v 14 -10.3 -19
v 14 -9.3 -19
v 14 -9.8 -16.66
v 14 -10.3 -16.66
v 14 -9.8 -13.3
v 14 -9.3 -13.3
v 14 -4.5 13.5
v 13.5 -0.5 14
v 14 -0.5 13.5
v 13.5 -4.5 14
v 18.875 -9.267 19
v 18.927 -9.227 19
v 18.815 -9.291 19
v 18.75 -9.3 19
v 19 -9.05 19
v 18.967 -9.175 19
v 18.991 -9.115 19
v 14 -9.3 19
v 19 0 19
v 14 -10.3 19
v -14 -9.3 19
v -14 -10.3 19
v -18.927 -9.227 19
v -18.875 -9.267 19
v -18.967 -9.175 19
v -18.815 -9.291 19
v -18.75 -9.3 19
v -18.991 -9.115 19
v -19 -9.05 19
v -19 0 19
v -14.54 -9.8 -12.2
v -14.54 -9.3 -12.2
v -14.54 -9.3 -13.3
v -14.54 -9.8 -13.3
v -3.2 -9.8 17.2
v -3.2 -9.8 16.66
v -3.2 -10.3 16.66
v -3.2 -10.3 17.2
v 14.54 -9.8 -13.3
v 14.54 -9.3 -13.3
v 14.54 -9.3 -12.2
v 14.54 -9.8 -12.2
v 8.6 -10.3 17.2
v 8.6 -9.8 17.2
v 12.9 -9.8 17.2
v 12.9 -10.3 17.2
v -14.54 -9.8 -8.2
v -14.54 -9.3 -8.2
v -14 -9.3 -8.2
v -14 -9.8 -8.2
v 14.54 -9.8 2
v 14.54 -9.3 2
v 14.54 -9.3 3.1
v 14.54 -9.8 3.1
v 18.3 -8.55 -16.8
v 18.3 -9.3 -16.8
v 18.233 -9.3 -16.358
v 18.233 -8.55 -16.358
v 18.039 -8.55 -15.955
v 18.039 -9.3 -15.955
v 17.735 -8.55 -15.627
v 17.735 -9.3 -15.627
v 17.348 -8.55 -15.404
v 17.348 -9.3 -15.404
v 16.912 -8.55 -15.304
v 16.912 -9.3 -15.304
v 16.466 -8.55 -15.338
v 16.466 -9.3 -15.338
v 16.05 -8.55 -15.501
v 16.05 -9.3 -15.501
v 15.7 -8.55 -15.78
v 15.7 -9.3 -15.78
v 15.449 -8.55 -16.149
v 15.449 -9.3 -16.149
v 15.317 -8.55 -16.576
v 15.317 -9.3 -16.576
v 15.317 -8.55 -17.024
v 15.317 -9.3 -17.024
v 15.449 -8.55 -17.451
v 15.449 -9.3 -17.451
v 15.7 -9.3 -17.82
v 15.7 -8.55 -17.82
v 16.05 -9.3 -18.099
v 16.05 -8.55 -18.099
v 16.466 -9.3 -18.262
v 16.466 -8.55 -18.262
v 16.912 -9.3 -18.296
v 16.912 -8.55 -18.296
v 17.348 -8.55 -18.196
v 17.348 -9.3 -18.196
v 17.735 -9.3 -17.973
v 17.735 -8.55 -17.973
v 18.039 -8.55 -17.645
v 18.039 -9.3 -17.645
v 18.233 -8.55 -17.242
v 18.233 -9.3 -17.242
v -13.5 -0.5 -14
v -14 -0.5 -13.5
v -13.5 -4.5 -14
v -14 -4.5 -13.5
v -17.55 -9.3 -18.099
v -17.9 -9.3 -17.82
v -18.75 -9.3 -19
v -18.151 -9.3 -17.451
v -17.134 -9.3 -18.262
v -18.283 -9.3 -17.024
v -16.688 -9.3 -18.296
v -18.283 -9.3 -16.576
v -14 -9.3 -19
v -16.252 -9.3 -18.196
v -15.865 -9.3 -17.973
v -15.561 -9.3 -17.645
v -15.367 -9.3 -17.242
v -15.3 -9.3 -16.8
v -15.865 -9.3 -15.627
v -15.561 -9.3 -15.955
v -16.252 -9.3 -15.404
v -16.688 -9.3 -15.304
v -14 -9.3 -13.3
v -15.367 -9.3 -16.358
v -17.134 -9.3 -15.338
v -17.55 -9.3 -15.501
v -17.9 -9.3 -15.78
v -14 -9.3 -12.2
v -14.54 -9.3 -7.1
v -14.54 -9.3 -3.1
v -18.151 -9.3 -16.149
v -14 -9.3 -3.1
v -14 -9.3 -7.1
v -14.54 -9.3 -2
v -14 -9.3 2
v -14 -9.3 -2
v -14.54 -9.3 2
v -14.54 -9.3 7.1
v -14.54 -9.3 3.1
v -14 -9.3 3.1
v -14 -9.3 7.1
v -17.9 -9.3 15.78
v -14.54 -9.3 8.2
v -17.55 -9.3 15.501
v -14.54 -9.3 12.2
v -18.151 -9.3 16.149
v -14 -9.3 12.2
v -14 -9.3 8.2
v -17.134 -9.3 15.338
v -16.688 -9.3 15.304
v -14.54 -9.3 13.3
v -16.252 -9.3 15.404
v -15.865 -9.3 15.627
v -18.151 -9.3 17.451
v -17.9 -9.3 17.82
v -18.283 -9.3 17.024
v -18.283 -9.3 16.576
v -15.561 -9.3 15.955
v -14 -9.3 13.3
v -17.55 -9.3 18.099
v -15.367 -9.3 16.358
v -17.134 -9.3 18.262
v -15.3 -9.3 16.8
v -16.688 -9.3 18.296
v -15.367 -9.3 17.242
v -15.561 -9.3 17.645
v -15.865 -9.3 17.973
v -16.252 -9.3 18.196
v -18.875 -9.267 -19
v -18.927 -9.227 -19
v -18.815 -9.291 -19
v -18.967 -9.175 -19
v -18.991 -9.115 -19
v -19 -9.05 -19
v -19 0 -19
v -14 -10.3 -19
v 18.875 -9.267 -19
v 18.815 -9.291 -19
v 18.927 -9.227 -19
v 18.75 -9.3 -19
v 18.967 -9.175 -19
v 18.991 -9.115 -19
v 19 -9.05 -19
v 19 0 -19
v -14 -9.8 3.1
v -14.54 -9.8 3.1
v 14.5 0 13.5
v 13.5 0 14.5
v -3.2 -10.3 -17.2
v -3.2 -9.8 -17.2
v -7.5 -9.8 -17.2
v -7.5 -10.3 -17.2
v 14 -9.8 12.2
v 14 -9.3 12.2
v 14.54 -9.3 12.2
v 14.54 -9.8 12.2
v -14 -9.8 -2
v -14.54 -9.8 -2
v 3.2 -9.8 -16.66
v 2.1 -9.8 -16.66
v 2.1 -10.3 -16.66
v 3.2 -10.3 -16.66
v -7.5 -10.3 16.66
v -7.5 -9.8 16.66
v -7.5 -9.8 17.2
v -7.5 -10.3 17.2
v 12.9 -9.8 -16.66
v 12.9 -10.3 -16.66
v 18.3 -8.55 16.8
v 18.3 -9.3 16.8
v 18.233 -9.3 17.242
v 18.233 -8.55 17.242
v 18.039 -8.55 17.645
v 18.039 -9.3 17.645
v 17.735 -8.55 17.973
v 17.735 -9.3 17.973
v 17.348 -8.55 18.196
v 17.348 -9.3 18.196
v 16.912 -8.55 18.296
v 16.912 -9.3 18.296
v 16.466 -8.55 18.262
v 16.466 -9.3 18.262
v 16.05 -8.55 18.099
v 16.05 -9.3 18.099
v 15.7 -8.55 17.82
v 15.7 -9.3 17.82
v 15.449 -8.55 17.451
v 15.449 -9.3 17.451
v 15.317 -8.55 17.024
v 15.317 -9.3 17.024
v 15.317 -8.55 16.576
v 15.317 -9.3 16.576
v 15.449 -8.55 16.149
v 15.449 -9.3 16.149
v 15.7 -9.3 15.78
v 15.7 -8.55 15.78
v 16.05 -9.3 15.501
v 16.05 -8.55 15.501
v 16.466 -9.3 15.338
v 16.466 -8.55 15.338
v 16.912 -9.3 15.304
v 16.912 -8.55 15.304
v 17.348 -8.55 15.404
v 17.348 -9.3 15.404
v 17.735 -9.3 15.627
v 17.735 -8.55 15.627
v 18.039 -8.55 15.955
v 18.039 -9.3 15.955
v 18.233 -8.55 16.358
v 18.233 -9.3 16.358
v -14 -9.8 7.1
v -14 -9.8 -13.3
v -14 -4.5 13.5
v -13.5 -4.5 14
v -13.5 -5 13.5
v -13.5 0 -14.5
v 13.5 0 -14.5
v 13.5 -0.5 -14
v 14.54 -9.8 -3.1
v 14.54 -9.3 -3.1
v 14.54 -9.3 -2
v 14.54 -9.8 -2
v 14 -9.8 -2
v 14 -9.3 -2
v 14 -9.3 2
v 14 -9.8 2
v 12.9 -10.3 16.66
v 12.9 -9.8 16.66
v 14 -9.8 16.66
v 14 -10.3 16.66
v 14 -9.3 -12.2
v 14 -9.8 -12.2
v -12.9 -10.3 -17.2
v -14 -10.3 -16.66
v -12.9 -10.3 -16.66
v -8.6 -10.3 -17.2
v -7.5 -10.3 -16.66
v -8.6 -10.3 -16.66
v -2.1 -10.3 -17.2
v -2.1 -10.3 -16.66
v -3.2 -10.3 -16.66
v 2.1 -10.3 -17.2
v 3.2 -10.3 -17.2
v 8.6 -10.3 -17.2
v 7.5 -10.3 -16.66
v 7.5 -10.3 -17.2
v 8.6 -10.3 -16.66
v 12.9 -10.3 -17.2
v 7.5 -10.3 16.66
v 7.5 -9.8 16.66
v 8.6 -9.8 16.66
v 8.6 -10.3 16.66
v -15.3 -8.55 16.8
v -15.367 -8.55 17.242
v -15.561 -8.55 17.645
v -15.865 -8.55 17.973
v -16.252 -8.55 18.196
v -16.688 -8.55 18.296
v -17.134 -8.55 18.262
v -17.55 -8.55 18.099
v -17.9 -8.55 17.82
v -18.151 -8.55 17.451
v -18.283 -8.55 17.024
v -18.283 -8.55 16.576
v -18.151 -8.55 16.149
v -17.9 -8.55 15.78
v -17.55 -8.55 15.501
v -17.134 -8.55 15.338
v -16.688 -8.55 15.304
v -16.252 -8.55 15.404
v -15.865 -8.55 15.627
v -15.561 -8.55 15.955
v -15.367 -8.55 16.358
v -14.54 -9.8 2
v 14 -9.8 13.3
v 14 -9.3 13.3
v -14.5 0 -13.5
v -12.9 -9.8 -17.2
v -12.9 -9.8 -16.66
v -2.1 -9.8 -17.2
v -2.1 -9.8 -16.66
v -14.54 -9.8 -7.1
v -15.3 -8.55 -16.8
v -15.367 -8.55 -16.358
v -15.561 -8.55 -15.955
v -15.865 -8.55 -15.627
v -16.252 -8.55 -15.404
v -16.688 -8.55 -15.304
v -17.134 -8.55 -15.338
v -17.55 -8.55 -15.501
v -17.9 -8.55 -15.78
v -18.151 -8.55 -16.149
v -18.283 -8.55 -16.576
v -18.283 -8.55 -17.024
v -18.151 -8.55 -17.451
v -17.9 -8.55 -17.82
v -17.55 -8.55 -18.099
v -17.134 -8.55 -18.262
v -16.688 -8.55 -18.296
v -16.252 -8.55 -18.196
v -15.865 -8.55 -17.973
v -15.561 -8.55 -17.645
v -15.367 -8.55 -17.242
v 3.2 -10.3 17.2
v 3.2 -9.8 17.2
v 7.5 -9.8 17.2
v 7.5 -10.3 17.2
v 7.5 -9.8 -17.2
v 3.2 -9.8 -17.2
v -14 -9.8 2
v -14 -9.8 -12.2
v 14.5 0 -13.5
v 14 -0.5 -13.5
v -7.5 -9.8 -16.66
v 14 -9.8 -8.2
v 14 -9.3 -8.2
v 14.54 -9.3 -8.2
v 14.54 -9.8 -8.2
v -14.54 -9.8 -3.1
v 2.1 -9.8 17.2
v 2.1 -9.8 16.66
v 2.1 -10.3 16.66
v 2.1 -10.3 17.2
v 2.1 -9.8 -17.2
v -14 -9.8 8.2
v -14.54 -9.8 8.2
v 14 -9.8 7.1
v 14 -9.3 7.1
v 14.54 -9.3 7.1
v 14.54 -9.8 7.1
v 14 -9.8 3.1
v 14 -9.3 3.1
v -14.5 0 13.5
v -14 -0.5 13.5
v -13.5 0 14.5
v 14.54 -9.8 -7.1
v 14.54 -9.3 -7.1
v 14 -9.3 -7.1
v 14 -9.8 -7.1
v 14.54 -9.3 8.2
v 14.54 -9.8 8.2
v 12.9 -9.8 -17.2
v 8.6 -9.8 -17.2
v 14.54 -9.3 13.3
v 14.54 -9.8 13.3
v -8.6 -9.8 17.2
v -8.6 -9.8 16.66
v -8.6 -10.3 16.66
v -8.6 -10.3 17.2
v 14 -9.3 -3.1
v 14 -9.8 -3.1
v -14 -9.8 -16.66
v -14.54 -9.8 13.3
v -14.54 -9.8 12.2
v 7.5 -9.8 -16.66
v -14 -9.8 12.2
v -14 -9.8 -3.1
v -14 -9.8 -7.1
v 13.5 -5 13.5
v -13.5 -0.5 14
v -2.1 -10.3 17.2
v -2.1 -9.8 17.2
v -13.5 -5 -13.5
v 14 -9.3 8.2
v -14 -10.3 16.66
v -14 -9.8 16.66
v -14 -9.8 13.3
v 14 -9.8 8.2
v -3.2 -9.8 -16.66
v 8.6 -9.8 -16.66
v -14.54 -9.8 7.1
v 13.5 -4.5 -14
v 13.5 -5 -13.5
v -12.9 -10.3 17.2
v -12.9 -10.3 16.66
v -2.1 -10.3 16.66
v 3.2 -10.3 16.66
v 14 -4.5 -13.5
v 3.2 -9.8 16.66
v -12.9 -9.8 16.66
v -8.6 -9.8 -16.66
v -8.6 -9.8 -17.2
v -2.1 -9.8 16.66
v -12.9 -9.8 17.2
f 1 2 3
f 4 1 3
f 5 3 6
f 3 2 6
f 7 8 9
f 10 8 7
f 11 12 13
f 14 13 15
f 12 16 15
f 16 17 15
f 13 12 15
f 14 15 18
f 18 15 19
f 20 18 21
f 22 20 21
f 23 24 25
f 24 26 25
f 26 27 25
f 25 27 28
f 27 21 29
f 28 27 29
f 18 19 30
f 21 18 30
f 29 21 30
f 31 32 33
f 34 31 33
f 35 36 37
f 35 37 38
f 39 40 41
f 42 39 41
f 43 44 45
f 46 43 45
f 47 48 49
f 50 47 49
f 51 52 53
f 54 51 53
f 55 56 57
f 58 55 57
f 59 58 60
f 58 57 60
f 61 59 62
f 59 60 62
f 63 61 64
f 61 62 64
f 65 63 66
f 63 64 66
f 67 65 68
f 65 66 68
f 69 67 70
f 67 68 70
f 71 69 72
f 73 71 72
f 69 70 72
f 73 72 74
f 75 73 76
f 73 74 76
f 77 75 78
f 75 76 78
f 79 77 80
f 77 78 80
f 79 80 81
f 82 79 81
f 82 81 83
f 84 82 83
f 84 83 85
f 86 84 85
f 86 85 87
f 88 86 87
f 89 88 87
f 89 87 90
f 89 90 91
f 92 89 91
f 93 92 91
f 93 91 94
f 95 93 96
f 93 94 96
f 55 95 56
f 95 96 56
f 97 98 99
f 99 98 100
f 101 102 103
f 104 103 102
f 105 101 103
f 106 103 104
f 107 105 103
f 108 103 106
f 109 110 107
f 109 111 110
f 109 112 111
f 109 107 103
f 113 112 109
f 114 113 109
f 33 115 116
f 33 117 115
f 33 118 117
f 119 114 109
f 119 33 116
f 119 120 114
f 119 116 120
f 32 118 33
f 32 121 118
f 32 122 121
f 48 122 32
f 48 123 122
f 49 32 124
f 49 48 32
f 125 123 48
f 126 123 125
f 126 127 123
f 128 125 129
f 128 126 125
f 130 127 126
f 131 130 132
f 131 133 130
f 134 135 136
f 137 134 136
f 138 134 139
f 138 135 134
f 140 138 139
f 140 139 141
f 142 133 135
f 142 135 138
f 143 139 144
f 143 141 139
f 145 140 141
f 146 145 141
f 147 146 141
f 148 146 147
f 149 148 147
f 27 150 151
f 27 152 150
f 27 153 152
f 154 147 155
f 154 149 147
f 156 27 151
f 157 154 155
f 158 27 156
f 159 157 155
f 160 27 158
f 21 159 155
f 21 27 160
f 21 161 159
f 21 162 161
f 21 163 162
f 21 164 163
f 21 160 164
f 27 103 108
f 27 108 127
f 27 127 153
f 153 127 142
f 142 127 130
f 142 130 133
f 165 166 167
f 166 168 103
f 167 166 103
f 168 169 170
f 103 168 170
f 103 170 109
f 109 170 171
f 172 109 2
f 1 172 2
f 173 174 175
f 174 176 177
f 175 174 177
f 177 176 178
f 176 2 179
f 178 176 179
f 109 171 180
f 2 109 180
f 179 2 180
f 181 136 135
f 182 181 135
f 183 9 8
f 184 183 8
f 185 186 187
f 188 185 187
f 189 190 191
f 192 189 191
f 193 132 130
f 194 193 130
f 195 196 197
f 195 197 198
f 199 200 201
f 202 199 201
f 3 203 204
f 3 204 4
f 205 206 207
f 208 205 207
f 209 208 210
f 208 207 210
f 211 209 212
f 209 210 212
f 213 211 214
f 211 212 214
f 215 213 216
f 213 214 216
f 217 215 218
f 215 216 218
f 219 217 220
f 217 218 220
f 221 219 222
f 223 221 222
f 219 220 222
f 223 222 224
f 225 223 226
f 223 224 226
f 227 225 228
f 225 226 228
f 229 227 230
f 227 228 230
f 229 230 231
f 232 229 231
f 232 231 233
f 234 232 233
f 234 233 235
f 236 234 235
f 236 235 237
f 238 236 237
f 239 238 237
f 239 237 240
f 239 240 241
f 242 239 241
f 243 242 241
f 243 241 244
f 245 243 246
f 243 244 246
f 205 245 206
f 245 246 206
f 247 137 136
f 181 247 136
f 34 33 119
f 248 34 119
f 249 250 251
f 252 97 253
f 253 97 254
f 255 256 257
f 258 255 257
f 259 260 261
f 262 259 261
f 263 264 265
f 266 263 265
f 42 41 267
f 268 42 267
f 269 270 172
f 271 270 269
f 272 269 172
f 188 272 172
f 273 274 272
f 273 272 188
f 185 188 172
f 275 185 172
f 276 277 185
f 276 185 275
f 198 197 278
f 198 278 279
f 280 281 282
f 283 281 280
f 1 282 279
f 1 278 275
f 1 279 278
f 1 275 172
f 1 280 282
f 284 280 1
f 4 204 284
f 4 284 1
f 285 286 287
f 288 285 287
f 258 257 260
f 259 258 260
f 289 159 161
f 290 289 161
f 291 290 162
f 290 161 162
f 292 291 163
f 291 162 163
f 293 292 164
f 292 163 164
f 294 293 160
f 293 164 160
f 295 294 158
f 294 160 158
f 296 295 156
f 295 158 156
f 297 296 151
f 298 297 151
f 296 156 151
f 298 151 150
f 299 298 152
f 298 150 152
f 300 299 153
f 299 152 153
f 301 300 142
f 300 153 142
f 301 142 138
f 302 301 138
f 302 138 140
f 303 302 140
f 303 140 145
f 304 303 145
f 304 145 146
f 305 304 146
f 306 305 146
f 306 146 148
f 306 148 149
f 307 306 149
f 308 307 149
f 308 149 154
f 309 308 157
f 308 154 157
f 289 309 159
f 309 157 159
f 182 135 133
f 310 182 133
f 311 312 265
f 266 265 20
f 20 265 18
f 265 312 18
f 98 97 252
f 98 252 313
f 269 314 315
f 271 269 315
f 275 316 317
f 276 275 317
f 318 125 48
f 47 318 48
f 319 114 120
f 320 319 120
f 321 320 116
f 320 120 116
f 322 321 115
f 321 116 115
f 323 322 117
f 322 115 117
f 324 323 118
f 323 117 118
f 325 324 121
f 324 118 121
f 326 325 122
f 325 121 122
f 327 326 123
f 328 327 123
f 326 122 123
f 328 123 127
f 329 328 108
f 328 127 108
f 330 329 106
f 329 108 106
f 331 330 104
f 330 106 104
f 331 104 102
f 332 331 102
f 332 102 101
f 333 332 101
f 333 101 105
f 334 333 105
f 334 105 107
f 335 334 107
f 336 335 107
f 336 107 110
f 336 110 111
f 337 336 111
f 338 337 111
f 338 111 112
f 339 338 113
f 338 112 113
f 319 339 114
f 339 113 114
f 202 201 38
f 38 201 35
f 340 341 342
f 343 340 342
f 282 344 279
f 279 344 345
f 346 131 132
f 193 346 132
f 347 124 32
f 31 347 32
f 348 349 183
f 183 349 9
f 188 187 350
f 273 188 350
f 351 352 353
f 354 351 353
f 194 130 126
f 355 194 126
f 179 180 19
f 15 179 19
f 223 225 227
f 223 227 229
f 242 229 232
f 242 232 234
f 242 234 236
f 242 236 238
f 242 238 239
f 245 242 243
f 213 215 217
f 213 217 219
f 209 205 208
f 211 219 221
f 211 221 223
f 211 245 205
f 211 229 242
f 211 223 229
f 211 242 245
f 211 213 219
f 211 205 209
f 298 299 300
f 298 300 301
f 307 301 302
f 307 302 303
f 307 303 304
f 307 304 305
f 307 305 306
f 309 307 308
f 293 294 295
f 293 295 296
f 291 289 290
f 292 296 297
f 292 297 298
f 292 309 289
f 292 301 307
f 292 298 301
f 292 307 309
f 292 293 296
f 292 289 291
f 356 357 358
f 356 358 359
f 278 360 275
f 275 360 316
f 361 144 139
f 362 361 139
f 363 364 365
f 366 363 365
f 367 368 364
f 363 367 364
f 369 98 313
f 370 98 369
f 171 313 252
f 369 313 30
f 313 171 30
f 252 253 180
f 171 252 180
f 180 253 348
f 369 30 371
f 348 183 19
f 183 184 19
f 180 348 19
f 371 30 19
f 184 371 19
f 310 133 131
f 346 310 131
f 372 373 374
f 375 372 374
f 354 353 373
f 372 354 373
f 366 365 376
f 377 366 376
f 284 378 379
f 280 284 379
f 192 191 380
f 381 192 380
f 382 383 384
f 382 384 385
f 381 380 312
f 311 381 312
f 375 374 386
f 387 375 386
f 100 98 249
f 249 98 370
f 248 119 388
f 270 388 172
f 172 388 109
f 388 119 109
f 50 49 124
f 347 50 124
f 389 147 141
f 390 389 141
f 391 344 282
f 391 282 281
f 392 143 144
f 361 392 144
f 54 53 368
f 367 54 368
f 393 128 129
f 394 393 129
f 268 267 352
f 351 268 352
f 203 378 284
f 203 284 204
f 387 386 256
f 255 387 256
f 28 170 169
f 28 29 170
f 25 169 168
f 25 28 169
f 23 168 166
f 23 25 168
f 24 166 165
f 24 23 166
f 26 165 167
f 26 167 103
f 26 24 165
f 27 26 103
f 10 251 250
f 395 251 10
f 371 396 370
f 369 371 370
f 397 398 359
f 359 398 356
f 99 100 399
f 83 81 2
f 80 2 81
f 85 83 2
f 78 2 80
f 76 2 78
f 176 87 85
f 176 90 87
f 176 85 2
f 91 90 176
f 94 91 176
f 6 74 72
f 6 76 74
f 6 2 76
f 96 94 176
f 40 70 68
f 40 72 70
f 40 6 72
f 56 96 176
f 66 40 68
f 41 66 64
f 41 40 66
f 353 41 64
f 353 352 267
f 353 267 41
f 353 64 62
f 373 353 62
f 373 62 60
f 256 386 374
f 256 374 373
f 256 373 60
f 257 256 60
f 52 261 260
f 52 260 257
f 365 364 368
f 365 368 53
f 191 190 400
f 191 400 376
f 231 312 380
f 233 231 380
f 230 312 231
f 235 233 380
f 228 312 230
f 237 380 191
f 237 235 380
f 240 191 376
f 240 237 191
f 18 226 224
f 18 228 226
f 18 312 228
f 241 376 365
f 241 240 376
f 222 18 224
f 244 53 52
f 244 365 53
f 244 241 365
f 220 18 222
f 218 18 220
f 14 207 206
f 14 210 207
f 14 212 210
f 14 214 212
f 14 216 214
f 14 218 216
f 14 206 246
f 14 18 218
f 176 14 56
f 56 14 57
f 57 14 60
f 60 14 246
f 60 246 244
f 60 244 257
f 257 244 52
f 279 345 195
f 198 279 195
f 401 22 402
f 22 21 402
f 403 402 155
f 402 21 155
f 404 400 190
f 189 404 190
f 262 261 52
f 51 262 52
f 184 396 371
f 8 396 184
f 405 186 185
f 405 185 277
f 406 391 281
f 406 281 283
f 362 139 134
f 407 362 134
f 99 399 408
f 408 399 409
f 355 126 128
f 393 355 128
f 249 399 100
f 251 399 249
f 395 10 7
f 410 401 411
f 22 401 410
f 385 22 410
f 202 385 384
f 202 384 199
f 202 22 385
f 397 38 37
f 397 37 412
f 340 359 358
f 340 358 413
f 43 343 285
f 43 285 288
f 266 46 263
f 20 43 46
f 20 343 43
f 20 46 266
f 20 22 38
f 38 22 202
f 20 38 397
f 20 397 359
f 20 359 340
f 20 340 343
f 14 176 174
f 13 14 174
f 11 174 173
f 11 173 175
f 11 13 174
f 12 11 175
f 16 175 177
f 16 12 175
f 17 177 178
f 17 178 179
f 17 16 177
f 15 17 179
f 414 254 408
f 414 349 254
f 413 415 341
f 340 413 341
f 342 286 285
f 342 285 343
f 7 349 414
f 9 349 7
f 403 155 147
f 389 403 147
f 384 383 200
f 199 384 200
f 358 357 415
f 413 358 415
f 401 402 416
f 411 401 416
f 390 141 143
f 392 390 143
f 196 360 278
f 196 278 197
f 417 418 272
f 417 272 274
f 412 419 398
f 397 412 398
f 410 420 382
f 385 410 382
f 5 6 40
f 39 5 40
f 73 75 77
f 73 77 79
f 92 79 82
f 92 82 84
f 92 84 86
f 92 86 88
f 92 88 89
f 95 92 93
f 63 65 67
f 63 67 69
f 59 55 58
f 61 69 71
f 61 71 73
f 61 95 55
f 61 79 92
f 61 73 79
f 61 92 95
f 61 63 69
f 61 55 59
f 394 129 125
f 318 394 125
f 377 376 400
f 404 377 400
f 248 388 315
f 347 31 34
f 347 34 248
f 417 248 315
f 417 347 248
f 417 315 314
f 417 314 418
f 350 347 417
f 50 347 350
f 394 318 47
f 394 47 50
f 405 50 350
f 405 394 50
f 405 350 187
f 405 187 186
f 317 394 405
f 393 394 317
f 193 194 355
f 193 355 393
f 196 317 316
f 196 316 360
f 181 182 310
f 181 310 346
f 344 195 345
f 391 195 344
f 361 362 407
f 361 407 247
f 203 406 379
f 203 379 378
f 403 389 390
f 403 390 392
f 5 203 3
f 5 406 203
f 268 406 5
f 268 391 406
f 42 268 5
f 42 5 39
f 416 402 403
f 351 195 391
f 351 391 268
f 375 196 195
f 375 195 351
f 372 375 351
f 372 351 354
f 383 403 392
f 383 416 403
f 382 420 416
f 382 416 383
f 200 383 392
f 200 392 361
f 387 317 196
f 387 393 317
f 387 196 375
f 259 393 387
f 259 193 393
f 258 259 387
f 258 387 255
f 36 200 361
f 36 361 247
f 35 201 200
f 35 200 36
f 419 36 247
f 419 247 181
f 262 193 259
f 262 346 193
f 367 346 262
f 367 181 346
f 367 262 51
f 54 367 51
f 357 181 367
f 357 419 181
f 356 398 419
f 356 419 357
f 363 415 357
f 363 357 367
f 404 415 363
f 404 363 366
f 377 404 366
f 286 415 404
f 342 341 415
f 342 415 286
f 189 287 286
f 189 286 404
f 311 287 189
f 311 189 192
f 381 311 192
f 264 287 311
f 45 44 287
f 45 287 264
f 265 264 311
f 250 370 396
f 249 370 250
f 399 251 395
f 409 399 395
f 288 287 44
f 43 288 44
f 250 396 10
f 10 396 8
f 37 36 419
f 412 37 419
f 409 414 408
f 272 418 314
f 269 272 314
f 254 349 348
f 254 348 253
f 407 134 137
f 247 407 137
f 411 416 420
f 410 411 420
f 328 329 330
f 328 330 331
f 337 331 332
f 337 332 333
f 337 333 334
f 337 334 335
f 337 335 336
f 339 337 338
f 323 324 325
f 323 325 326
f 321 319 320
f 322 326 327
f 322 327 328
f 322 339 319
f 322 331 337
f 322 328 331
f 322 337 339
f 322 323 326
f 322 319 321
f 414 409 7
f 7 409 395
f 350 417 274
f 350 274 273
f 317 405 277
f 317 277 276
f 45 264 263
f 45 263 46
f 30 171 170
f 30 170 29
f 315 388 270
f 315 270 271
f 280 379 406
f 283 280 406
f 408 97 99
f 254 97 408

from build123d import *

# Parameters (mm, degrees)
F0_W      = 38
F0_H      = 38
F1_DEPTH  = 9.3
F2_R      = 1.5
F3_DEPTH  = 0.75
F5_DEPTH  = 0.5
F6_W      = 1.1
F6_H      = 0.54
F7_DEPTH  = 0.5
F8_R      = 0.25
F9_W      = 28
F9_H      = 28
F10_DEPTH = 5
F11_SIZE  = 0.5


with BuildPart() as f1:
    # F0 (on Front) → F1 (new body)
    with BuildSketch(Plane.XZ):
        Rectangle(F0_W, F0_H)
    extrude(amount=F1_DEPTH)

    # F2 (on face) → F3 (cut)
    with BuildSketch(Plane.XZ.offset(9.3)):
        with Locations((-16.8, 16.8)):
            Circle(F2_R)
        with Locations((16.8, 16.8)):
            Circle(F2_R)
        with Locations((16.8, -16.8)):
            Circle(F2_R)
        with Locations((-16.8, -16.8)):
            Circle(F2_R)
    extrude(amount=-F3_DEPTH, mode=Mode.SUBTRACT)

    # F4 (on face) → F5 (join)
    with BuildSketch(Plane.XZ.offset(9.3)):
        Polygon((14, 19), (0, 19), (-14, 19), (-14, 13.3), (-14.54, 13.3), (-14.54, 12.2), (-14, 12.2), (-14, 8.2), (-14.54, 8.2), (-14.54, 7.1), (-14, 7.1), (-14, 3.1), (-14.54, 3.1), (-14.54, 2), (-14, 2), (-14, -2), (-14.54, -2), (-14.54, -3.1), (-14, -3.1), (-14, -7.1), (-14.54, -7.1), (-14.54, -8.2), (-14, -8.2), (-14, -12.2), (-14.54, -12.2), (-14.54, -13.3), (-14, -13.3), (-14, -19), (0, -19), (14, -19), (14, -13.3), (14.54, -13.3), (14.54, -12.2), (14, -12.2), (14, -8.2), (14.54, -8.2), (14.54, -7.1), (14, -7.1), (14, -3.1), (14.54, -3.1), (14.54, -2), (14, -2), (14, 2), (14.54, 2), (14.54, 3.1), (14, 3.1), (14, 7.1), (14.54, 7.1), (14.54, 8.2), (14, 8.2), (14, 12.2), (14.54, 12.2), (14.54, 13.3), (14, 13.3), align=None)
    extrude(amount=F5_DEPTH)

    # F6 (on face) → F7 (join)
    with BuildSketch(Plane.XZ.offset(9.8)):
        Polygon((14, 17.2), (14, 19), (-14, 19), (-14, 17.2), (-12.9, 17.2), (-8.6, 17.2), (-7.5, 17.2), (-3.2, 17.2), (-2.1, 17.2), (2.1, 17.2), (3.2, 17.2), (7.5, 17.2), (8.6, 17.2), (12.9, 17.2), align=None)
        with Locations((13.45, 16.93)):
            Rectangle(F6_W, F6_H)
        with Locations((-13.45, 16.93)):
            Rectangle(F6_W, F6_H)
        with Locations((8.05, 16.93)):
            Rectangle(F6_W, F6_H)
        with Locations((-8.05, 16.93)):
            Rectangle(F6_W, F6_H)
        with Locations((2.65, 16.93)):
            Rectangle(F6_W, F6_H)
        with Locations((-2.65, 16.93)):
            Rectangle(F6_W, F6_H)
        with Locations((-13.45, -16.93)):
            Rectangle(F6_W, F6_H)
        Polygon((-12.9, -17.2), (-14, -17.2), (-14, -19), (14, -19), (14, -17.2), (12.9, -17.2), (8.6, -17.2), (7.5, -17.2), (3.2, -17.2), (2.1, -17.2), (-2.1, -17.2), (-3.2, -17.2), (-7.5, -17.2), (-8.6, -17.2), align=None)
        with Locations((-8.05, -16.93)):
            Rectangle(F6_W, F6_H)
        with Locations((13.45, -16.93)):
            Rectangle(F6_W, F6_H)
        with Locations((-2.65, -16.93)):
            Rectangle(F6_W, F6_H)
        with Locations((8.05, -16.93)):
            Rectangle(F6_W, F6_H)
        with Locations((2.65, -16.93)):
            Rectangle(F6_W, F6_H)
    extrude(amount=F7_DEPTH)

    # F8
    f8_edges = [f1.edges().sort_by_distance(p)[0] for p in [
        (-19, -9.3, 0),
        (19, -9.3, 0),
    ]]
    fillet(f8_edges, radius=F8_R)

    # F9 (on face) → F10 (cut)
    with BuildSketch(Plane.XZ):
        Rectangle(F9_W, F9_H)
    extrude(amount=F10_DEPTH, mode=Mode.SUBTRACT)

    # F11
    f11_edges = [f1.edges().sort_by_distance(p)[0] for p in [
        (-14, -2.5, 14),
        (0, -5, 14),
        (-14, -5, 0),
        (14, -2.5, 14),
        (14, -2.5, -14),
        (14, 0, 0),
        (14, -5, 0),
        (-14, -2.5, -14),
        (0, 0, -14),
        (0, -5, -14),
        (0, 0, 14),
        (-14, 0, 0),
    ]]
    chamfer(f11_edges, length=F11_SIZE)


solid = f1.part
